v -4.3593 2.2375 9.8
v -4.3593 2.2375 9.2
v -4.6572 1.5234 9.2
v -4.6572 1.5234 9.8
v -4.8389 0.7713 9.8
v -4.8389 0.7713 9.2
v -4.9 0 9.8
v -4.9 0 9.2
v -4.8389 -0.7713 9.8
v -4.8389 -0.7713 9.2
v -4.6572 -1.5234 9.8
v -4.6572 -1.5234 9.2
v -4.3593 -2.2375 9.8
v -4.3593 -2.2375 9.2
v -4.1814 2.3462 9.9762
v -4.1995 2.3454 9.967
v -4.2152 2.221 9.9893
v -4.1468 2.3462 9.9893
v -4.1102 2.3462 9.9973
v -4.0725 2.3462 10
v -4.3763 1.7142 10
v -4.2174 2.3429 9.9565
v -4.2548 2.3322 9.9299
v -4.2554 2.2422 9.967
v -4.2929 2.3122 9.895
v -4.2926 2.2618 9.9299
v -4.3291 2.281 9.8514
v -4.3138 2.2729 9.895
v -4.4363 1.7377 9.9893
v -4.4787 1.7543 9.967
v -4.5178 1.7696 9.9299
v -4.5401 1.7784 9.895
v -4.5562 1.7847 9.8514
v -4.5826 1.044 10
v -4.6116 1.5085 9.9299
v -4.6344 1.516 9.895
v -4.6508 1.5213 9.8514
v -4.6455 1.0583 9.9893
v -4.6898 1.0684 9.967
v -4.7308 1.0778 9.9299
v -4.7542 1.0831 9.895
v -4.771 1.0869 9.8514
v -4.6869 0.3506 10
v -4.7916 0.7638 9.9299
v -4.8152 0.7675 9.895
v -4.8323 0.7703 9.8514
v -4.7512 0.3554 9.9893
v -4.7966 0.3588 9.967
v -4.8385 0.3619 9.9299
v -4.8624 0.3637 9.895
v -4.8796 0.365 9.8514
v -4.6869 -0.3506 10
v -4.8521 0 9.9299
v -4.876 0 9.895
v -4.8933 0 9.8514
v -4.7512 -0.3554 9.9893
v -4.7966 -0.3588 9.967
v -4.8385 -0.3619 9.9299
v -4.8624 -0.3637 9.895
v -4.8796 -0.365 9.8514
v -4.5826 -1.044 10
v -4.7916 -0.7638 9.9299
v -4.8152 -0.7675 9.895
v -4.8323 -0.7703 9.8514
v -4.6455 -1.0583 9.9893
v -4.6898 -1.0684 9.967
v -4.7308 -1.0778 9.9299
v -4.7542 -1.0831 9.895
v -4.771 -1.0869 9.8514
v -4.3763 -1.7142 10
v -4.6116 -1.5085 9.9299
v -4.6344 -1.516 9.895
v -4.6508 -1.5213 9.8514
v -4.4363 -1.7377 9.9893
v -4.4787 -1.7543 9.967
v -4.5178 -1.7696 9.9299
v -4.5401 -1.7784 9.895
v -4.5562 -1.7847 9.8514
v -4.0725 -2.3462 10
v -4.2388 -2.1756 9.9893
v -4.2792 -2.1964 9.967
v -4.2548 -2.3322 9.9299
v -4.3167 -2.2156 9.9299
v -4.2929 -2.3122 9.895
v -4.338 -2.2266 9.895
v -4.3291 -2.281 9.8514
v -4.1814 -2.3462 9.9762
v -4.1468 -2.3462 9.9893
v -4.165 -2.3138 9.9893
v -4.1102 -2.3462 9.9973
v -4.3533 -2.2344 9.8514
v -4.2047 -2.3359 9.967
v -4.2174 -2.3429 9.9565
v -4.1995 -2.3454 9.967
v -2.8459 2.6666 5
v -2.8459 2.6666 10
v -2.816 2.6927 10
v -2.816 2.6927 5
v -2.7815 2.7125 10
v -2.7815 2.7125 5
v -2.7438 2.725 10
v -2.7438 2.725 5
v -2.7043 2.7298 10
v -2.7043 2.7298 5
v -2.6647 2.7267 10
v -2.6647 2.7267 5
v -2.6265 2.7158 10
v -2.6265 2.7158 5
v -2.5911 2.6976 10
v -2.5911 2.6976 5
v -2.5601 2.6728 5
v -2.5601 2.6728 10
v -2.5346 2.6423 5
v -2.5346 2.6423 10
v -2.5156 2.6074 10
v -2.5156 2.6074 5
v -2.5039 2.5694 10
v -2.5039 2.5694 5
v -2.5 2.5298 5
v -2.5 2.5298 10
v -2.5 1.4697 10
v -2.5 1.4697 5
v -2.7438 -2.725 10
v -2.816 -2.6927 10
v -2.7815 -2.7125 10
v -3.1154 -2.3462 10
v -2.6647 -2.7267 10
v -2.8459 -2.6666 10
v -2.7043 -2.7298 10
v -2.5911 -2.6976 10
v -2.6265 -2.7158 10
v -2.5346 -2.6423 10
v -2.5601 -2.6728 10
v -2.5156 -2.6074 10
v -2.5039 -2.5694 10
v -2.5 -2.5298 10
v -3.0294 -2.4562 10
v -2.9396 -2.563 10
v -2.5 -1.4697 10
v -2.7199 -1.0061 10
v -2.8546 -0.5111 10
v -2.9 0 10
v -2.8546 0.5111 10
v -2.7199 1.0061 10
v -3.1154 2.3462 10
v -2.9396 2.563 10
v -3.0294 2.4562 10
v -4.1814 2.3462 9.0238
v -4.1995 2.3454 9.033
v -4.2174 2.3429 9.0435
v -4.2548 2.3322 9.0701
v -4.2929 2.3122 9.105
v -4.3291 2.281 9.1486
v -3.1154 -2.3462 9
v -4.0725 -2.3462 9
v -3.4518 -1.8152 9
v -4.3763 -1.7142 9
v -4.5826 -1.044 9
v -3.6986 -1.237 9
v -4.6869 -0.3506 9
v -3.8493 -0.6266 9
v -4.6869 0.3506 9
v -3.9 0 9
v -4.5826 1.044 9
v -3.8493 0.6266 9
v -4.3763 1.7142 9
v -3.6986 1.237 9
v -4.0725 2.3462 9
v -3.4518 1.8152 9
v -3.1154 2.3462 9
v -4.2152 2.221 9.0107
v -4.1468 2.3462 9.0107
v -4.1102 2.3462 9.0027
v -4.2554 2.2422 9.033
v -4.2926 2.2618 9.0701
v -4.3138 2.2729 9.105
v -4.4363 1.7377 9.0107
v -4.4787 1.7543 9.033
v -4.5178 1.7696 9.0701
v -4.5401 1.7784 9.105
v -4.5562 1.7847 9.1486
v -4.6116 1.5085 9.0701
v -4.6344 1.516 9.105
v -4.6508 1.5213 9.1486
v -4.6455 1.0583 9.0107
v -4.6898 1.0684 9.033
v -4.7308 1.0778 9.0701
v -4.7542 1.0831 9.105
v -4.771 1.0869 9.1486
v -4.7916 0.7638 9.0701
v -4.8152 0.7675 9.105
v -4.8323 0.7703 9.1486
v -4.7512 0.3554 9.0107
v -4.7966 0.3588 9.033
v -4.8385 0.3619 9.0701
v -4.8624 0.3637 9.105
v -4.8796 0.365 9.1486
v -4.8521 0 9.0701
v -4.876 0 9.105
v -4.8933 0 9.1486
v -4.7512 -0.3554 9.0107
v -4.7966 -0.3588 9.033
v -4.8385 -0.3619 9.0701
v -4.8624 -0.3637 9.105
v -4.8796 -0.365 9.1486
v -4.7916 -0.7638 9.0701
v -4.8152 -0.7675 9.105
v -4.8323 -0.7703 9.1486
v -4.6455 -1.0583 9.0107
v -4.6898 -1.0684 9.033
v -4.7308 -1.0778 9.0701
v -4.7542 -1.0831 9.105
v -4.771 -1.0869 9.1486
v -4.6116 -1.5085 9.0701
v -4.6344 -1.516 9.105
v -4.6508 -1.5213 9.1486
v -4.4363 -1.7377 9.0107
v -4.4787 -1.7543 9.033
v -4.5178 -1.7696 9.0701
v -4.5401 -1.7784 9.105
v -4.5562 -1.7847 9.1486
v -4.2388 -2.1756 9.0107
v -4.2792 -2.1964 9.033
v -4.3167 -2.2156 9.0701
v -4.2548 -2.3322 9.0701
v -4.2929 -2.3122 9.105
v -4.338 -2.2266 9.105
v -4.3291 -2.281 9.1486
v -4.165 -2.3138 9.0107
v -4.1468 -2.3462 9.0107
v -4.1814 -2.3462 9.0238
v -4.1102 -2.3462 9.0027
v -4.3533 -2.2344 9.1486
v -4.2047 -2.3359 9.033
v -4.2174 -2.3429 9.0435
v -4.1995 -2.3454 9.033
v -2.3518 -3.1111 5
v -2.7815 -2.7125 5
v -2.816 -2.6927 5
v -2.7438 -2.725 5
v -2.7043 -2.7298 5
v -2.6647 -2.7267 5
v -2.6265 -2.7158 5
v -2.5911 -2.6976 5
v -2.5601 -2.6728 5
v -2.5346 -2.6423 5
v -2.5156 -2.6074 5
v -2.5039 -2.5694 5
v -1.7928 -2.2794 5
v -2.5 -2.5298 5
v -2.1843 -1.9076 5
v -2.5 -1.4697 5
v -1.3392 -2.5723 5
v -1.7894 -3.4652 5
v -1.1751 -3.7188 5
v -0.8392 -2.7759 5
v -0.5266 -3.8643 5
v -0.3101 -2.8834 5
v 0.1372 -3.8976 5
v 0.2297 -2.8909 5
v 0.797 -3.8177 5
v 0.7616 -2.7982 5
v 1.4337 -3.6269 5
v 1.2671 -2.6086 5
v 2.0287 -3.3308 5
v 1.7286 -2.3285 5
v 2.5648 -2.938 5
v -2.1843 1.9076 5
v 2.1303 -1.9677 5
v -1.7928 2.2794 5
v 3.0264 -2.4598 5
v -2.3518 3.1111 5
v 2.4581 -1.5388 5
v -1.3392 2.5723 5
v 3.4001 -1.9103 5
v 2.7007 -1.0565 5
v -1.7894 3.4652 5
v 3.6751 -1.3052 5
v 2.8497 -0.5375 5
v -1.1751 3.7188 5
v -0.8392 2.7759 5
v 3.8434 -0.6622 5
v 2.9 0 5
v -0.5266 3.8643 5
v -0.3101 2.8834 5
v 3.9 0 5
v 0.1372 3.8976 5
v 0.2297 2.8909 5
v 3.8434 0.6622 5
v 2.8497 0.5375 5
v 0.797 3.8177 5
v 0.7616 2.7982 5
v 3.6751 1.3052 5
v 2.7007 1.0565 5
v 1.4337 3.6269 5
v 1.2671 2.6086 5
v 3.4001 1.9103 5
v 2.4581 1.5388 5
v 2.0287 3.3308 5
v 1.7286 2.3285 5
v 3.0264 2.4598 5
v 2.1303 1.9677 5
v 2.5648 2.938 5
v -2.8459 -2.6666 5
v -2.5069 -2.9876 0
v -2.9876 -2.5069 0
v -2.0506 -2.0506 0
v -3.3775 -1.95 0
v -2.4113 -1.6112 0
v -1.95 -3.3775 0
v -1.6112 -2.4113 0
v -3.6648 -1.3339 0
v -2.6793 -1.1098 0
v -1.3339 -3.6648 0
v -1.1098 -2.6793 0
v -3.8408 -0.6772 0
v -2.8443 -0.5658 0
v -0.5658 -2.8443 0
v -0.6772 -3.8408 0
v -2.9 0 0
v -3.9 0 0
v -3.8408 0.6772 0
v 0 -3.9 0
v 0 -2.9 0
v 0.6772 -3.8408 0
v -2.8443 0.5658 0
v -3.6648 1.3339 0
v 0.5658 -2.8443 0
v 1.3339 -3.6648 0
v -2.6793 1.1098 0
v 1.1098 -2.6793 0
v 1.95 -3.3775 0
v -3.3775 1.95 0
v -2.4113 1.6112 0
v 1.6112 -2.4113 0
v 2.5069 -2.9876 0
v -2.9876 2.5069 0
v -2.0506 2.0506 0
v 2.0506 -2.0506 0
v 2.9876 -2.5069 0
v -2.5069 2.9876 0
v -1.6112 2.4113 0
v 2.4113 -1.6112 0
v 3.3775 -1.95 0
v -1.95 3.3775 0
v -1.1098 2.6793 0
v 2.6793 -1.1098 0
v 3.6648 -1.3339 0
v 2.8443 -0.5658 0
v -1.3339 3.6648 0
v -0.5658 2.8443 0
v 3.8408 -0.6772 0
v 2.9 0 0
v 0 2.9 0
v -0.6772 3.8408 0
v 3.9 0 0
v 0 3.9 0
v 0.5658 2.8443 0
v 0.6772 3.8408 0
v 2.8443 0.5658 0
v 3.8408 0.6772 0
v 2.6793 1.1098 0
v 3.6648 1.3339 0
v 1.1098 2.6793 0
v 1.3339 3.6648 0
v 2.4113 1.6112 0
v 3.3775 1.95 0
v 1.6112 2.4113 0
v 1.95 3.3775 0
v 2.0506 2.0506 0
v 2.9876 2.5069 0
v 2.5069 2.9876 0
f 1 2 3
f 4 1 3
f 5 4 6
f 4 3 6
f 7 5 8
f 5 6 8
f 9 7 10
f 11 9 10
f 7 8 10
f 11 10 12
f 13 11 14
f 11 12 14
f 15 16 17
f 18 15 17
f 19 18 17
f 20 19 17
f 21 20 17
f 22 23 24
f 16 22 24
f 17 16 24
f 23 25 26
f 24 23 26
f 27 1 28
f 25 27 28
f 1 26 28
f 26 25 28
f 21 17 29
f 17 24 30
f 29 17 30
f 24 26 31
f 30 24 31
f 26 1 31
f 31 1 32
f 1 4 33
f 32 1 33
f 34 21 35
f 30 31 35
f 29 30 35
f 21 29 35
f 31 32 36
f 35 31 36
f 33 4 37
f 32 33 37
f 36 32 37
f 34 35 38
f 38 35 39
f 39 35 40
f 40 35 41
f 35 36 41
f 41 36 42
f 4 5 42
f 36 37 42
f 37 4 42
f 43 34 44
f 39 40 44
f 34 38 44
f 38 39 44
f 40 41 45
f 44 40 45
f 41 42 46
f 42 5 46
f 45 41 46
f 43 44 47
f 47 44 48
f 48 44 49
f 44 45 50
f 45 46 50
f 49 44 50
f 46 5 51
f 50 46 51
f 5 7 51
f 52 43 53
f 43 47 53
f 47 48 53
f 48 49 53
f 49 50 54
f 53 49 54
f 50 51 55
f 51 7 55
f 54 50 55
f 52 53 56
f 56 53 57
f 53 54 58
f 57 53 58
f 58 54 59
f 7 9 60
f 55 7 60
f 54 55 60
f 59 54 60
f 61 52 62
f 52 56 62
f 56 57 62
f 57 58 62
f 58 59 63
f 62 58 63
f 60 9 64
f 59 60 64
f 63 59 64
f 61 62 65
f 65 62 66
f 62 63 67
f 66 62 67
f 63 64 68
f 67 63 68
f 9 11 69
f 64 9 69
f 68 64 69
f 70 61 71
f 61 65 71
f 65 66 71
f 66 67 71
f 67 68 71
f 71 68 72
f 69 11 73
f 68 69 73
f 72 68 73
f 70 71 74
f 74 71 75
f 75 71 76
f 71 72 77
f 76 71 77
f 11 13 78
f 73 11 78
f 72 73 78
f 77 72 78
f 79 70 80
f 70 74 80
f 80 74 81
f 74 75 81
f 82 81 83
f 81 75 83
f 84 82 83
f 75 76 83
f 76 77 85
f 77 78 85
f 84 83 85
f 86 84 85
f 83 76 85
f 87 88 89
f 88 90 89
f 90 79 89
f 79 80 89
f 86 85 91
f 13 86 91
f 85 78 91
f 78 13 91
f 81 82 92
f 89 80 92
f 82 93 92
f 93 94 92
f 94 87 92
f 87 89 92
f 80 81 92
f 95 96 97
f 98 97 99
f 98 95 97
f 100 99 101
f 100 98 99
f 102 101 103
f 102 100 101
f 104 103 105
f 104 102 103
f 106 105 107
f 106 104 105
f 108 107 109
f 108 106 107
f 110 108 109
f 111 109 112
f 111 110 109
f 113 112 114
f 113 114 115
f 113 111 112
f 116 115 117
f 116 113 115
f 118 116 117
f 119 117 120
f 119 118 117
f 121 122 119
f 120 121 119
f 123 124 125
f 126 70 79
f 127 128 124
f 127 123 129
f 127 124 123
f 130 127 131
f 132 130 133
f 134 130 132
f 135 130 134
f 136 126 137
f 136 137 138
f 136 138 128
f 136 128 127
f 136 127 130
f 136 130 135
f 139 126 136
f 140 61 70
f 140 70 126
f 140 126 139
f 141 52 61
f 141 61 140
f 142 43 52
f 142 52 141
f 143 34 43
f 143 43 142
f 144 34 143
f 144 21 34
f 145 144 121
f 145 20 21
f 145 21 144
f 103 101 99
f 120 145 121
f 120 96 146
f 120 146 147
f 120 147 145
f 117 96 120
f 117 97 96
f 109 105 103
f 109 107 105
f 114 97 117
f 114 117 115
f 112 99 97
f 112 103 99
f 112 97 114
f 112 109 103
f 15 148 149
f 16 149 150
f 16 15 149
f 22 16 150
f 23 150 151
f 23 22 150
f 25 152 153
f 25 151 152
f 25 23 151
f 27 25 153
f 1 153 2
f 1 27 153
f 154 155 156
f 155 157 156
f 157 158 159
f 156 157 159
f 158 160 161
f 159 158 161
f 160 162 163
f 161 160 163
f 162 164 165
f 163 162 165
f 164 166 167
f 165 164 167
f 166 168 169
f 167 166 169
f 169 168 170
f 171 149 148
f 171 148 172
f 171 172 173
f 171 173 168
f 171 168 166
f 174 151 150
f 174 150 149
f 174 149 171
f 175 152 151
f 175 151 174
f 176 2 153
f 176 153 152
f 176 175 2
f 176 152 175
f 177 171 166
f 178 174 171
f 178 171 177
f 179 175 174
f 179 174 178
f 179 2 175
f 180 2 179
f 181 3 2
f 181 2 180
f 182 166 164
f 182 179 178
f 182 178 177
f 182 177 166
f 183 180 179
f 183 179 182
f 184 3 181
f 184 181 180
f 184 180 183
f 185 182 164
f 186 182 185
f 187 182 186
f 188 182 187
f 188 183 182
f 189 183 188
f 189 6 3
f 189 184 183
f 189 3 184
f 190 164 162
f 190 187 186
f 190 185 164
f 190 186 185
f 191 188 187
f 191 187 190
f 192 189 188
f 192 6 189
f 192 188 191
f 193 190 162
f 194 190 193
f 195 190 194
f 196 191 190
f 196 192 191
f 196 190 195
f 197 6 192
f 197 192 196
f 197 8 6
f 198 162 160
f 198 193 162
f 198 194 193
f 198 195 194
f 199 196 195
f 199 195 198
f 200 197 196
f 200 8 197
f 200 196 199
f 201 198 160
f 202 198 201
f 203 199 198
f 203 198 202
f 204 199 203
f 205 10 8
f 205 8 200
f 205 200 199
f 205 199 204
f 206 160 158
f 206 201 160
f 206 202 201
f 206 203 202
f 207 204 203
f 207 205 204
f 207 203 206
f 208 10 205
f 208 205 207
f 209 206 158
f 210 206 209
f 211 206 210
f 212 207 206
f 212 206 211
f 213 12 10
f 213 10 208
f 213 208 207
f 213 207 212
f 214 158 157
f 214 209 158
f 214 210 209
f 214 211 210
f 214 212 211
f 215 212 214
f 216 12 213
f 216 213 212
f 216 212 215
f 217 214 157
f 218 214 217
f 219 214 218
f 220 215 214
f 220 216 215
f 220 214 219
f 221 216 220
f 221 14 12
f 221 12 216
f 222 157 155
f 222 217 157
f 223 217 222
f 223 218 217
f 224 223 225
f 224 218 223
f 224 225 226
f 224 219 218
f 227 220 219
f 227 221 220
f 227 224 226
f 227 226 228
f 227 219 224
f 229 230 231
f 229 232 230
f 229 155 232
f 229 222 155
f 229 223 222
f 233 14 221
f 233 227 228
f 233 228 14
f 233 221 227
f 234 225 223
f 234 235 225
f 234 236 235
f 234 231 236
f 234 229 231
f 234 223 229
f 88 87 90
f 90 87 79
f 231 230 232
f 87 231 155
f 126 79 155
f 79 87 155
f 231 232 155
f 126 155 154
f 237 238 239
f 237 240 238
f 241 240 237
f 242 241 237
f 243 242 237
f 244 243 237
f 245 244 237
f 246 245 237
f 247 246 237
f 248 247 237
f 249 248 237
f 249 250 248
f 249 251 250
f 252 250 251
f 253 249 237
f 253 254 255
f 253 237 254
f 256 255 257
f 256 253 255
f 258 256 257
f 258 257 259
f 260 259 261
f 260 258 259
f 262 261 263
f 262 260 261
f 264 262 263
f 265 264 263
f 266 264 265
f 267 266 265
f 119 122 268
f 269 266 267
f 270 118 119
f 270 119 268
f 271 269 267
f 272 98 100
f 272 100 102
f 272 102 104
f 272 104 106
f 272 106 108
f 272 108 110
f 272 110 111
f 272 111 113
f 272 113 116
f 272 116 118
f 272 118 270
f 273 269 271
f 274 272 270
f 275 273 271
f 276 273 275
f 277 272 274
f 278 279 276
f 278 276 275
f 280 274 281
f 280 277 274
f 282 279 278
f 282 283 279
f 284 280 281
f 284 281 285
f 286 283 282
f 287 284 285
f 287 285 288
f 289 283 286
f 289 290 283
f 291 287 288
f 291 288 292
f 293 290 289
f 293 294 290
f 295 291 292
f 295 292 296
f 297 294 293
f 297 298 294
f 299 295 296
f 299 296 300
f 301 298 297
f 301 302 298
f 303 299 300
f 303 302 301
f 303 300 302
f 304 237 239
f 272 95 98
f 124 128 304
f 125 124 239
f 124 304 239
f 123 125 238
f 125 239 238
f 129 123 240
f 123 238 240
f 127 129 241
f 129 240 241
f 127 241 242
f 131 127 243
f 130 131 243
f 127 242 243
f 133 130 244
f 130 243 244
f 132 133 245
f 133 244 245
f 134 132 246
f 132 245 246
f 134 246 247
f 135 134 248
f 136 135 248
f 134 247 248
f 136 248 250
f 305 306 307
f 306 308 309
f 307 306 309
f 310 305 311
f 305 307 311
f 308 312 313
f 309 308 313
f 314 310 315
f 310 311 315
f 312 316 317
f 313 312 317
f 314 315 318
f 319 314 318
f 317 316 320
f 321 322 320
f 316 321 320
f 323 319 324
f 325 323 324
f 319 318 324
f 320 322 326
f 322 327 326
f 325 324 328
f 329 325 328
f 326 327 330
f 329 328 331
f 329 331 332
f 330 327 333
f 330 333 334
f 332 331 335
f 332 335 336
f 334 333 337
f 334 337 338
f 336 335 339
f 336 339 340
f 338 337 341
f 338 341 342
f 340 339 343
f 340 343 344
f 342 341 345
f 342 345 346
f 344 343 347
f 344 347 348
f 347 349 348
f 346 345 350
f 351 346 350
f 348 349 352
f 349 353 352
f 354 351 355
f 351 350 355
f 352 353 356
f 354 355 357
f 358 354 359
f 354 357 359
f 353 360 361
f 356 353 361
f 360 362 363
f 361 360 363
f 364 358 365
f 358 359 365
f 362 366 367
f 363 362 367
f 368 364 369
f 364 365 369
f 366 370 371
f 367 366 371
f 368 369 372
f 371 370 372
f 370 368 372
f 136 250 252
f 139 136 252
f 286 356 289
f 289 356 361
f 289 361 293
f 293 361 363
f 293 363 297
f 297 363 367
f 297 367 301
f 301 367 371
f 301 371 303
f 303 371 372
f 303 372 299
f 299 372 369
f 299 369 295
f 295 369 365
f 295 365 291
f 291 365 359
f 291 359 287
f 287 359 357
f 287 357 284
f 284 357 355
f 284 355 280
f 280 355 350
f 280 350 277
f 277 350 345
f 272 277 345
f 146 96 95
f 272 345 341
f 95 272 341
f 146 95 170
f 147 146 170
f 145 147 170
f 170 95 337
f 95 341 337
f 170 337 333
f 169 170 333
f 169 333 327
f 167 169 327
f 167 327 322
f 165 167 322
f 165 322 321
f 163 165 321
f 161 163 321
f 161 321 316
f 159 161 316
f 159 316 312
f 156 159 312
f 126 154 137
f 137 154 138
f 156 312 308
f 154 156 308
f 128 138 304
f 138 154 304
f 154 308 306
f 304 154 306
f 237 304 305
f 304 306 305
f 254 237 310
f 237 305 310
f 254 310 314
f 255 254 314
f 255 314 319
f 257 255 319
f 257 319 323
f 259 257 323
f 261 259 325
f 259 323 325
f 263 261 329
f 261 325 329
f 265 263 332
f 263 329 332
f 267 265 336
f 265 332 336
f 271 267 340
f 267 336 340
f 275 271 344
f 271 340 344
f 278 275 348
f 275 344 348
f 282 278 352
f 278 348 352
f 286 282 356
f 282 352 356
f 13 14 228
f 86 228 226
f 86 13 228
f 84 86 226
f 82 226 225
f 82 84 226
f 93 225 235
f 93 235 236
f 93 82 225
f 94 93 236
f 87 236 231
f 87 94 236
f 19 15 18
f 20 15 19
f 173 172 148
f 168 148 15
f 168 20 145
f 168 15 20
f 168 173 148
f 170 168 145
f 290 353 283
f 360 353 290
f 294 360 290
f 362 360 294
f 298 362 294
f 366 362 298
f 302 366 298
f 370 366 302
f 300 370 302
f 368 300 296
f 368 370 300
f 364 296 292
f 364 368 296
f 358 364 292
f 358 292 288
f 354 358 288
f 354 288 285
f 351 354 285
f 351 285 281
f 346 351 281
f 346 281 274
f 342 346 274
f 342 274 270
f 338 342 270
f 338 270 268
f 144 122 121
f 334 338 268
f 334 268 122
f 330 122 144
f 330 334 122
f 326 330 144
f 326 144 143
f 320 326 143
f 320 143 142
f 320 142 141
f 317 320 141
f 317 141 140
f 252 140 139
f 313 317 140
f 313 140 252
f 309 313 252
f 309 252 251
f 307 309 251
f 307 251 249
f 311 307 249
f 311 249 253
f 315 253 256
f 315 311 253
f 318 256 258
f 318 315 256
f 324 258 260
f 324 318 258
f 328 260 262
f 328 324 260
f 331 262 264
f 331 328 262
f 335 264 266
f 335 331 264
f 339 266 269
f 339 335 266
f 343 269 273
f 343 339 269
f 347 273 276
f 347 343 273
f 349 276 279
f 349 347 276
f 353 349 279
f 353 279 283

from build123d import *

# Parameters (mm, degrees)
SKETCH_R     = 3.9
SKETCH_R_2   = 2.9
PAD_DEPTH    = 10
SKETCH001_W  = 6.4
SKETCH001_H  = 7.8
POCKET_DEPTH = 5.001
PAD001_DEPTH = 1
FILLET_R     = 0.2
FILLET001_R  = 0.2


with BuildPart() as part:
    # Sketch → Pad (new body)
    with BuildSketch(Plane.XY):
        Circle(SKETCH_R)
        Circle(SKETCH_R_2, mode=Mode.SUBTRACT)
    extrude(amount=PAD_DEPTH)

    # Sketch001 → Pocket (cut, through all)
    with BuildSketch(Plane.XY.offset(5)):
        with Locations((0.7, 0)):
            Rectangle(SKETCH001_W, SKETCH001_H)
    extrude(amount=POCKET_DEPTH, mode=Mode.SUBTRACT)

    # Sketch002 → Pad001 (join)
    with BuildSketch(Plane.XY.offset(9)):
        with BuildLine():
            ThreePointArc((-4.301793, 2.346184), (-4.9, 0), (-4.301793, -2.346184))
            Line((-4.301793, -2.346184), (-3.115352, -2.346184))
            ThreePointArc((-3.115352, 2.346184), (-3.9, 0), (-3.115352, -2.346184))
            Line((-4.301793, 2.346184), (-3.115352, 2.346184))
        make_face()
    extrude(amount=PAD001_DEPTH)

    # Fillet
    fillet_edges = [part.edges().sort_by_distance(p)[0] for p in [
        (-2.5, -2.993326, 7.5),
        (-2.5, 2.993326, 7.5),
    ]]
    fillet(fillet_edges, radius=FILLET_R)

    # Fillet001
    fillet001_edges = [part.edges().sort_by_distance(p)[0] for p in [
        (-4.301793, 2.346184, 9.5),
        (-4.301793, -2.346184, 9.5),
        (-4.9, 0, 9),
        (-4.9, 0, 10),
    ]]
    fillet(fillet001_edges, radius=FILLET001_R)


solid = part.part
